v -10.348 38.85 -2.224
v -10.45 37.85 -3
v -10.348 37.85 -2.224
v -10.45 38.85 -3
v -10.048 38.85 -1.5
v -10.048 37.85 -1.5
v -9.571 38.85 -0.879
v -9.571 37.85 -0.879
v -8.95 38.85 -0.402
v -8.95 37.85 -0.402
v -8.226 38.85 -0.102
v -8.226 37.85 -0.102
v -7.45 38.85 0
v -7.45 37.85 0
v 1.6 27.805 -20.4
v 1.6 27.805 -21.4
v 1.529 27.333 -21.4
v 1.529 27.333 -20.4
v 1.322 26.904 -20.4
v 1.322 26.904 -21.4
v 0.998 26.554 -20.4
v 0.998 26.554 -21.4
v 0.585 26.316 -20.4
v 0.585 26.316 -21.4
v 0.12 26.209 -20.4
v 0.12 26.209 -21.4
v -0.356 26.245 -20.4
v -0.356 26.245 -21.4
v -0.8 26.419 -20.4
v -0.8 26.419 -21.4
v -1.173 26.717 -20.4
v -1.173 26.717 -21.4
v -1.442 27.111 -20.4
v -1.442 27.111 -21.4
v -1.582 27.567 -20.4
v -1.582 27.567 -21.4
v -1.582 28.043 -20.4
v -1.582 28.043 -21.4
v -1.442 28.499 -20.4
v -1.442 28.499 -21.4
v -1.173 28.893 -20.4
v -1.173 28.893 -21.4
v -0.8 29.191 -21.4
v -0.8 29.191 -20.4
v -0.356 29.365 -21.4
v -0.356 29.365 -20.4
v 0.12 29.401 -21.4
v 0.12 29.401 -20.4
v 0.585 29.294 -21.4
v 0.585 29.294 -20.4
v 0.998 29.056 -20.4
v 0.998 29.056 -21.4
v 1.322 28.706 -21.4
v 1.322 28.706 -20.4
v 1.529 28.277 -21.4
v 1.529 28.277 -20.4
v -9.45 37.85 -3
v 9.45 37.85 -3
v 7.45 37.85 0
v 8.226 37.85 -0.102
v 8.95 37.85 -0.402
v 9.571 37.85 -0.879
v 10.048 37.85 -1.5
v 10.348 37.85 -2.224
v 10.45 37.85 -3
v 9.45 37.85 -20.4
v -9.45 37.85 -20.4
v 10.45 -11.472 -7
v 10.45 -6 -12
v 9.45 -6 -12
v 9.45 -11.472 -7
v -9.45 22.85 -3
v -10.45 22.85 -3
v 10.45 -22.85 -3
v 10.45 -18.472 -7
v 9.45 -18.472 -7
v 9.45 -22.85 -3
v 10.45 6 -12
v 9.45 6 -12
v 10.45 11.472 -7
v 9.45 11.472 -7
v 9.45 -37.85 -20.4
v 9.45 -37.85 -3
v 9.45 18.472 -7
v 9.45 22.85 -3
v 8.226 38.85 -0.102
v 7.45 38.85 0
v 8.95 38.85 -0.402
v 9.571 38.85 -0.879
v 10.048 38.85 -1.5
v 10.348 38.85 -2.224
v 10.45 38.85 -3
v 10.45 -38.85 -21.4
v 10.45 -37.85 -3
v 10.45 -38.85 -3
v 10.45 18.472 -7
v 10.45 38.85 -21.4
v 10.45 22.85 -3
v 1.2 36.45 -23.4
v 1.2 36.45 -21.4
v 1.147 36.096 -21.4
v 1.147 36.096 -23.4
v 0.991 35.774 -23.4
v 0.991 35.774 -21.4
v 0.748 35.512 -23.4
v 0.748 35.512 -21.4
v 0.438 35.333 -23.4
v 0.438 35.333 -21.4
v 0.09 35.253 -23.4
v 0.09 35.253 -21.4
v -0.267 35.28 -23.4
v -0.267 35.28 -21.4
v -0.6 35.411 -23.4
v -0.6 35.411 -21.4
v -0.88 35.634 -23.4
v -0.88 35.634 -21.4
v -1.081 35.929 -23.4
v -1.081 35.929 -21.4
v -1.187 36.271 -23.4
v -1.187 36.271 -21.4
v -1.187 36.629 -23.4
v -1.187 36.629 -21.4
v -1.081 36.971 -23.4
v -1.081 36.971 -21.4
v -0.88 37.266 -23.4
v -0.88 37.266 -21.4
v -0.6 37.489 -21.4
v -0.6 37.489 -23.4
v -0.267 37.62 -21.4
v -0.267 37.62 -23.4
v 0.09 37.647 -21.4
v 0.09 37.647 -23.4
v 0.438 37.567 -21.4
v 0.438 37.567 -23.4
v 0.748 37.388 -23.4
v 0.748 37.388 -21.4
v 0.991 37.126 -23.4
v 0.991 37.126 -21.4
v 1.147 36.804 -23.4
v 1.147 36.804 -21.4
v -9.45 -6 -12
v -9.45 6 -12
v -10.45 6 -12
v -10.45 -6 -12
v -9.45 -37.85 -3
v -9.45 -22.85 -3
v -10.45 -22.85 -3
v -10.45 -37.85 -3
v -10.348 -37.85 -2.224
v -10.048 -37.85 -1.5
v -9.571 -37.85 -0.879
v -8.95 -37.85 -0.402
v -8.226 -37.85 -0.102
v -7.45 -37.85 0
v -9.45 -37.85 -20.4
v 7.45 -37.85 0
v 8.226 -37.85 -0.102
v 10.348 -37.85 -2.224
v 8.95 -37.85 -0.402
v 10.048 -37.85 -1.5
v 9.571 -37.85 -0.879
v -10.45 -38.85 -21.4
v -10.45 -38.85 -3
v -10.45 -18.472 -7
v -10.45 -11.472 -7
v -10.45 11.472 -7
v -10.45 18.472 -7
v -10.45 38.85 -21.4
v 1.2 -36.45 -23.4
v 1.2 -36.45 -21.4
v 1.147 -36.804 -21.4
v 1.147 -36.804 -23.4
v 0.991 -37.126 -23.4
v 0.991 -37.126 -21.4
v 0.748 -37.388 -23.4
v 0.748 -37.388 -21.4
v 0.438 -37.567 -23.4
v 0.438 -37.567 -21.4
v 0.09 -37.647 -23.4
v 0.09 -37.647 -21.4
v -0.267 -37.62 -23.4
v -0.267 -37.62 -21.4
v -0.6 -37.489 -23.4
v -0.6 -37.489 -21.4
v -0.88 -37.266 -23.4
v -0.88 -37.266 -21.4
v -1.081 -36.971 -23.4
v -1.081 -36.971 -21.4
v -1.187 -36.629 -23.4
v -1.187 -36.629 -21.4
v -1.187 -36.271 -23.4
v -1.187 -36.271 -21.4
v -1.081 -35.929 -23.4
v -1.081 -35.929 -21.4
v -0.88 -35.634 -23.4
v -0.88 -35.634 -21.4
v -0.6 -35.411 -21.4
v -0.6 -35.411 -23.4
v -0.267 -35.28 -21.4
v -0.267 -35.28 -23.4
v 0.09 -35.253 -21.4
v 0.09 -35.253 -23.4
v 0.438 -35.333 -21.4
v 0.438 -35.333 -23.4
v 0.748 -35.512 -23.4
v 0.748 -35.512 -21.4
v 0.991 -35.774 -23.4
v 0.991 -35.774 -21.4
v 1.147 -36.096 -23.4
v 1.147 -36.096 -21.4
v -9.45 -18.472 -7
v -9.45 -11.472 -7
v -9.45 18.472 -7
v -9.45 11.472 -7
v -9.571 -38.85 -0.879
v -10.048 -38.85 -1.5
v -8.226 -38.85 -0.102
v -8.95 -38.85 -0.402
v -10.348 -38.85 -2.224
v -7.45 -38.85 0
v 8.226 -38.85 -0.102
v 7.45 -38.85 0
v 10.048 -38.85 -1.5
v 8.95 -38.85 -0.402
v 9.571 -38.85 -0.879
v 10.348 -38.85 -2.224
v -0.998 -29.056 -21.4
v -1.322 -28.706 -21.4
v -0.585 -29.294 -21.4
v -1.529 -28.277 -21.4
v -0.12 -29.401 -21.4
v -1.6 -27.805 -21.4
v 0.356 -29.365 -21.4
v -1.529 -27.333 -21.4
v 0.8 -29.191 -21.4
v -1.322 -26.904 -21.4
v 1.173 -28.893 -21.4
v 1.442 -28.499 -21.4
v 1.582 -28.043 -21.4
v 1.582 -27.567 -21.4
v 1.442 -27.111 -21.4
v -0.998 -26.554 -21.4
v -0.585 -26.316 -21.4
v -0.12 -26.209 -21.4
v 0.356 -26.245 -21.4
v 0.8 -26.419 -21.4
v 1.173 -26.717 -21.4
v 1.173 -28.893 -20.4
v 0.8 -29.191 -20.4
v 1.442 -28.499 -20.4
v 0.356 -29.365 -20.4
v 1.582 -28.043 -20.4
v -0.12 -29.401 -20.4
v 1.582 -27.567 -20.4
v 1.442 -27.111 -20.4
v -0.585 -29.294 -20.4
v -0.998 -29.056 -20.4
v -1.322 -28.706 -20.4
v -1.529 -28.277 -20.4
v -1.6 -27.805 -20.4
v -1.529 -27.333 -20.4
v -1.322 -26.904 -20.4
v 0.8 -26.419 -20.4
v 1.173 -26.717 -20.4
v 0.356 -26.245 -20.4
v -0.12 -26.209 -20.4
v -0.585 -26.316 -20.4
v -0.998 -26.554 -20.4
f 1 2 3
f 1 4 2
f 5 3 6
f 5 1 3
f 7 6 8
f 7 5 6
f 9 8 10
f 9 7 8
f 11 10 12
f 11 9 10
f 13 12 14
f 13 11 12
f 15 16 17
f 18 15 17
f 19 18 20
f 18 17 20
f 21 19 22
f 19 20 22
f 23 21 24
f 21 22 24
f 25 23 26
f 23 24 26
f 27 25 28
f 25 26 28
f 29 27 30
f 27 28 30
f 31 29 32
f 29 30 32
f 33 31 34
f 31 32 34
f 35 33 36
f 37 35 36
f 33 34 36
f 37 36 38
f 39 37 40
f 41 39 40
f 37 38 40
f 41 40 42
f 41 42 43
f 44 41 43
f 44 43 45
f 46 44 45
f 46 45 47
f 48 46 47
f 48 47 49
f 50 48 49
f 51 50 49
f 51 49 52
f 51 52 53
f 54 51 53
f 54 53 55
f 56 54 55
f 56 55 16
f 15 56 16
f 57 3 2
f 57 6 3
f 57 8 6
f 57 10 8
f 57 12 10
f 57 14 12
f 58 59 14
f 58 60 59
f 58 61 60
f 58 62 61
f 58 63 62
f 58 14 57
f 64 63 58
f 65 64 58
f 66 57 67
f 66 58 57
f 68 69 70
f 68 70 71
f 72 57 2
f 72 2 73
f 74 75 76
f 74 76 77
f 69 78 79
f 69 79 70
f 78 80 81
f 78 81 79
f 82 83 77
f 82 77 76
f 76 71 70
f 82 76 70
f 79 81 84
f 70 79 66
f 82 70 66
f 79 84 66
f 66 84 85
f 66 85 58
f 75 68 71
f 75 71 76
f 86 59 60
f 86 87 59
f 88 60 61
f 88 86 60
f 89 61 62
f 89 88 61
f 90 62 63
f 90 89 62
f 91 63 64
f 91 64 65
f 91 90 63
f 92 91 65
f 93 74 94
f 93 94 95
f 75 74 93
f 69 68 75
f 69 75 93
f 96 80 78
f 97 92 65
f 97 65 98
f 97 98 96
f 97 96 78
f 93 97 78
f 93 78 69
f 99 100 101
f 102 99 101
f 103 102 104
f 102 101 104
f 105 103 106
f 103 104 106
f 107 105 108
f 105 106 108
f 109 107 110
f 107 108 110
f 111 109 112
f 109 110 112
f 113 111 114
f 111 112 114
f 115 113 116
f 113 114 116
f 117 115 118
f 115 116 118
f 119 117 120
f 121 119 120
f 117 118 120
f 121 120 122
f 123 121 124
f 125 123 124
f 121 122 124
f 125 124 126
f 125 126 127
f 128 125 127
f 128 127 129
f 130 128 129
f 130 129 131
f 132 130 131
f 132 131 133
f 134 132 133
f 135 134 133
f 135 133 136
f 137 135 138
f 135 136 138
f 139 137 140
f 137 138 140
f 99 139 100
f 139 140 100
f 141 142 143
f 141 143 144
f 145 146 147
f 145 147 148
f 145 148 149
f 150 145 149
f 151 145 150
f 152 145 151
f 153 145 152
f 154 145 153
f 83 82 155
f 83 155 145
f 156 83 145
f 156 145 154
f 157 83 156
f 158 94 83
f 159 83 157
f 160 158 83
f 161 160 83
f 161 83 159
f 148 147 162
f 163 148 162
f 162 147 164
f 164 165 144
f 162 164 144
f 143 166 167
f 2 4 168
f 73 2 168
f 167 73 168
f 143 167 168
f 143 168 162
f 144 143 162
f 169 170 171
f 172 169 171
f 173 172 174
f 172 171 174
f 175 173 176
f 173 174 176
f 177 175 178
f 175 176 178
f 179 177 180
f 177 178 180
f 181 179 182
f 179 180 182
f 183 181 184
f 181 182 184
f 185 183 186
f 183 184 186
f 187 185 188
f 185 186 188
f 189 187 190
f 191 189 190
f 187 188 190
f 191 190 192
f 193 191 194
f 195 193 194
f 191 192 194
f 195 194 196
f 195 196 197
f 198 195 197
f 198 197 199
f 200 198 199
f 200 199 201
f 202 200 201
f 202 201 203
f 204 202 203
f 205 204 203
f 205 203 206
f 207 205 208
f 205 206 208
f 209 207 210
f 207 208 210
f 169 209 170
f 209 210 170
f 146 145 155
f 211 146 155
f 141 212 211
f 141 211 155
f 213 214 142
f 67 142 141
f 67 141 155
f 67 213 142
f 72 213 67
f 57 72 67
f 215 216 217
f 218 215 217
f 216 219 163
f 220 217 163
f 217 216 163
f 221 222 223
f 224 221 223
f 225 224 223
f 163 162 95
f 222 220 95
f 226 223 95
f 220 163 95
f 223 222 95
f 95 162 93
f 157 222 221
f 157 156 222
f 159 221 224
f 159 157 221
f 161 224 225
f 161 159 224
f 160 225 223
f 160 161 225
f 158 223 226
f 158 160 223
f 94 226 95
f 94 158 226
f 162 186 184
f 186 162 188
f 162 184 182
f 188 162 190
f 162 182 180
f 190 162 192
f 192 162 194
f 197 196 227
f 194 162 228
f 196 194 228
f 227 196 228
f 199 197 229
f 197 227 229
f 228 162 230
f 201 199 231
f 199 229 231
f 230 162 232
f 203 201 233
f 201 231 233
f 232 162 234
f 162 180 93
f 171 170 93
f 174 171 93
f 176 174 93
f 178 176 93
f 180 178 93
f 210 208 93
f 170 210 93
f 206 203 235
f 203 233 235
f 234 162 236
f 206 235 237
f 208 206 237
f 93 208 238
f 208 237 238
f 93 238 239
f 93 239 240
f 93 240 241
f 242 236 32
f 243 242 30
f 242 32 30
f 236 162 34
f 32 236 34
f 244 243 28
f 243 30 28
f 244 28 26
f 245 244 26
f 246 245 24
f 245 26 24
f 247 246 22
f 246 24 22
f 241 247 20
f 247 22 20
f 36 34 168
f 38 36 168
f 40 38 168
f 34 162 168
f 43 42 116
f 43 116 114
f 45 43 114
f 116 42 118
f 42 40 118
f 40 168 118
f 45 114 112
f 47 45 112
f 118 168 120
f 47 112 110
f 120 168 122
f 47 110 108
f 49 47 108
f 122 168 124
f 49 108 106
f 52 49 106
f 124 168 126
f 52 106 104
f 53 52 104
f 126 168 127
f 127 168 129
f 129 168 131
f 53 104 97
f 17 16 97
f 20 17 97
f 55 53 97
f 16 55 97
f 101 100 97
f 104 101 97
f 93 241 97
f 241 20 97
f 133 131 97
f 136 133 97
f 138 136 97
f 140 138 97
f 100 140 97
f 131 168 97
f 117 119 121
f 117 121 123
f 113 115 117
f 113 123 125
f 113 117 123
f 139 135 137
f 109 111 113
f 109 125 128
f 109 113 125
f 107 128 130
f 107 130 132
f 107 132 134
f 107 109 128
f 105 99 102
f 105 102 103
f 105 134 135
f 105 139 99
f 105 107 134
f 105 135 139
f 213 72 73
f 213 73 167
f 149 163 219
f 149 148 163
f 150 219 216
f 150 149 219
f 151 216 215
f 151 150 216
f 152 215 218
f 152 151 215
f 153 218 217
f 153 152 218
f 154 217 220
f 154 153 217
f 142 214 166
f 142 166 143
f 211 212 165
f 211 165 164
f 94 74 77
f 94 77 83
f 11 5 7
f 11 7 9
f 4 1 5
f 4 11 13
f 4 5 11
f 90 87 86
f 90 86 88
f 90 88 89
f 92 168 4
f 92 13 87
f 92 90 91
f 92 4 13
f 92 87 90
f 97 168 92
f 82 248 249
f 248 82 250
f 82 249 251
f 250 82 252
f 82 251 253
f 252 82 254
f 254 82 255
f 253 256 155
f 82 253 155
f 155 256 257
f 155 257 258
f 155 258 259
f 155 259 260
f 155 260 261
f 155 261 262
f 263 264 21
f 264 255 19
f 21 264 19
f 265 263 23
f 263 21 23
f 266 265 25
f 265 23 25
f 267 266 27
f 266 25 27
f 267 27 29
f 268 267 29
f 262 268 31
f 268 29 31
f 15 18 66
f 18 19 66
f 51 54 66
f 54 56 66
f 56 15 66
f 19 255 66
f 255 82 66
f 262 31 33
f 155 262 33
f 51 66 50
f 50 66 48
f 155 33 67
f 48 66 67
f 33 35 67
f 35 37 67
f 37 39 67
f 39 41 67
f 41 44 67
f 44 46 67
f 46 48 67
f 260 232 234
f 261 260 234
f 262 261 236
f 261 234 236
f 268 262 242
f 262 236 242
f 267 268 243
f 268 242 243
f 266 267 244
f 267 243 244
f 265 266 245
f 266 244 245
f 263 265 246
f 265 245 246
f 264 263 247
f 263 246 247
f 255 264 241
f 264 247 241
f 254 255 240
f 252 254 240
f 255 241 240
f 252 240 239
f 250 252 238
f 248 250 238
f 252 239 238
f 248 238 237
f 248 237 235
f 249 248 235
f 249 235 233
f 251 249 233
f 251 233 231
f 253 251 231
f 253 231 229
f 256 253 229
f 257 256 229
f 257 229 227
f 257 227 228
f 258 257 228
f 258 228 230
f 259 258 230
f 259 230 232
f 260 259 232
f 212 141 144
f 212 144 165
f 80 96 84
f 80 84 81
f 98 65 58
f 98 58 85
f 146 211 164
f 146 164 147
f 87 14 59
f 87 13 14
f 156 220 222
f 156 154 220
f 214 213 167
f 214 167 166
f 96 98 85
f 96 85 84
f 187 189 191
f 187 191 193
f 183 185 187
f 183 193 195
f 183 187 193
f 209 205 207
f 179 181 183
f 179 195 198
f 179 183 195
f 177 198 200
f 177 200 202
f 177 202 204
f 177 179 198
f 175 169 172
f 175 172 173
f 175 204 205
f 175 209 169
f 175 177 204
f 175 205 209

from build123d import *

# Parameters (mm, degrees)
SKETCH1_W           = 20.9
SKETCH1_H           = 21.4
BOSS_EXTRUDE1_DEPTH = 38.85
SKETCH2_W           = 18.9
SKETCH2_H           = 75.7
CUT_EXTRUDE1_DEPTH  = 20.4
CUT_EXTRUDE4_DEPTH  = 50.031545968
SKETCH4_R           = 1.2
BOSS_EXTRUDE2_DEPTH = 2
SKETCH5_R           = 1.6
CUT_EXTRUDE5_DEPTH  = 46.568464973
FILLET1_R           = 3


with BuildPart() as part:
    # Sketch1 → Boss-Extrude1 (new, symmetric)
    with BuildSketch(Plane(origin=(0, 0, 0), x_dir=(1, 0, 0), z_dir=(0, 1, 0))):
        with Locations((0, 10.7)):
            Rectangle(SKETCH1_W, SKETCH1_H)
    extrude(amount=BOSS_EXTRUDE1_DEPTH, both=True)

    # Sketch2 → Cut-Extrude1 (cut)
    with BuildSketch(Plane(origin=(0, 0, 0), x_dir=(-1, 0, 0), z_dir=(0, 0, -1))):
        Rectangle(SKETCH2_W, SKETCH2_H)
    extrude(amount=CUT_EXTRUDE1_DEPTH, mode=Mode.SUBTRACT)

    # Sketch3 → Cut-Extrude4 (cut, through all)
    with BuildSketch(Plane(origin=(10.45, 0, 0), x_dir=(0, 0, -1), z_dir=(1, 0, 0))):
        Polygon((0, 37.85), (3, 37.85), (3, 22.85), (7, 18.472222222), (7, 11.472222222), (12, 6), (12, -6), (7, -11.472222222), (7, -18.472222222), (3, -22.85), (3, -37.85), (0, -37.85), align=None)
    extrude(amount=-CUT_EXTRUDE4_DEPTH, mode=Mode.SUBTRACT)

    # Sketch4 → Boss-Extrude2 (add)
    with BuildSketch(Plane(origin=(0, 0, -21.4), x_dir=(-1, 0, 0), z_dir=(0, 0, -1))):
        with Locations(Location((0, -36.45, 0), (0, 0, 180))):
            Circle(SKETCH4_R)
        with Locations(Location((0, 36.45, 0), (0, 0, 180))):
            Circle(SKETCH4_R)
    extrude(amount=BOSS_EXTRUDE2_DEPTH)

    # Sketch5 → Cut-Extrude5 (cut, through all)
    with BuildSketch(Plane(origin=(0, 0, -21.4), x_dir=(-1, 0, 0), z_dir=(0, 0, -1))):
        with Locations((0, -27.805)):
            Circle(SKETCH5_R)
        with Locations(Location((0, 27.805, 0), (0, 0, 180))):
            Circle(SKETCH5_R)
    extrude(amount=-CUT_EXTRUDE5_DEPTH, mode=Mode.SUBTRACT)

    # Fillet1
    fillet1_edges = [part.edges().sort_by_distance(p)[0] for p in [
        (-10.45, 38.35, 0),
        (10.45, 38.35, 0),
        (-10.45, -38.35, 0),
        (10.45, -38.35, 0),
    ]]
    fillet(fillet1_edges, radius=FILLET1_R)


solid = part.part
